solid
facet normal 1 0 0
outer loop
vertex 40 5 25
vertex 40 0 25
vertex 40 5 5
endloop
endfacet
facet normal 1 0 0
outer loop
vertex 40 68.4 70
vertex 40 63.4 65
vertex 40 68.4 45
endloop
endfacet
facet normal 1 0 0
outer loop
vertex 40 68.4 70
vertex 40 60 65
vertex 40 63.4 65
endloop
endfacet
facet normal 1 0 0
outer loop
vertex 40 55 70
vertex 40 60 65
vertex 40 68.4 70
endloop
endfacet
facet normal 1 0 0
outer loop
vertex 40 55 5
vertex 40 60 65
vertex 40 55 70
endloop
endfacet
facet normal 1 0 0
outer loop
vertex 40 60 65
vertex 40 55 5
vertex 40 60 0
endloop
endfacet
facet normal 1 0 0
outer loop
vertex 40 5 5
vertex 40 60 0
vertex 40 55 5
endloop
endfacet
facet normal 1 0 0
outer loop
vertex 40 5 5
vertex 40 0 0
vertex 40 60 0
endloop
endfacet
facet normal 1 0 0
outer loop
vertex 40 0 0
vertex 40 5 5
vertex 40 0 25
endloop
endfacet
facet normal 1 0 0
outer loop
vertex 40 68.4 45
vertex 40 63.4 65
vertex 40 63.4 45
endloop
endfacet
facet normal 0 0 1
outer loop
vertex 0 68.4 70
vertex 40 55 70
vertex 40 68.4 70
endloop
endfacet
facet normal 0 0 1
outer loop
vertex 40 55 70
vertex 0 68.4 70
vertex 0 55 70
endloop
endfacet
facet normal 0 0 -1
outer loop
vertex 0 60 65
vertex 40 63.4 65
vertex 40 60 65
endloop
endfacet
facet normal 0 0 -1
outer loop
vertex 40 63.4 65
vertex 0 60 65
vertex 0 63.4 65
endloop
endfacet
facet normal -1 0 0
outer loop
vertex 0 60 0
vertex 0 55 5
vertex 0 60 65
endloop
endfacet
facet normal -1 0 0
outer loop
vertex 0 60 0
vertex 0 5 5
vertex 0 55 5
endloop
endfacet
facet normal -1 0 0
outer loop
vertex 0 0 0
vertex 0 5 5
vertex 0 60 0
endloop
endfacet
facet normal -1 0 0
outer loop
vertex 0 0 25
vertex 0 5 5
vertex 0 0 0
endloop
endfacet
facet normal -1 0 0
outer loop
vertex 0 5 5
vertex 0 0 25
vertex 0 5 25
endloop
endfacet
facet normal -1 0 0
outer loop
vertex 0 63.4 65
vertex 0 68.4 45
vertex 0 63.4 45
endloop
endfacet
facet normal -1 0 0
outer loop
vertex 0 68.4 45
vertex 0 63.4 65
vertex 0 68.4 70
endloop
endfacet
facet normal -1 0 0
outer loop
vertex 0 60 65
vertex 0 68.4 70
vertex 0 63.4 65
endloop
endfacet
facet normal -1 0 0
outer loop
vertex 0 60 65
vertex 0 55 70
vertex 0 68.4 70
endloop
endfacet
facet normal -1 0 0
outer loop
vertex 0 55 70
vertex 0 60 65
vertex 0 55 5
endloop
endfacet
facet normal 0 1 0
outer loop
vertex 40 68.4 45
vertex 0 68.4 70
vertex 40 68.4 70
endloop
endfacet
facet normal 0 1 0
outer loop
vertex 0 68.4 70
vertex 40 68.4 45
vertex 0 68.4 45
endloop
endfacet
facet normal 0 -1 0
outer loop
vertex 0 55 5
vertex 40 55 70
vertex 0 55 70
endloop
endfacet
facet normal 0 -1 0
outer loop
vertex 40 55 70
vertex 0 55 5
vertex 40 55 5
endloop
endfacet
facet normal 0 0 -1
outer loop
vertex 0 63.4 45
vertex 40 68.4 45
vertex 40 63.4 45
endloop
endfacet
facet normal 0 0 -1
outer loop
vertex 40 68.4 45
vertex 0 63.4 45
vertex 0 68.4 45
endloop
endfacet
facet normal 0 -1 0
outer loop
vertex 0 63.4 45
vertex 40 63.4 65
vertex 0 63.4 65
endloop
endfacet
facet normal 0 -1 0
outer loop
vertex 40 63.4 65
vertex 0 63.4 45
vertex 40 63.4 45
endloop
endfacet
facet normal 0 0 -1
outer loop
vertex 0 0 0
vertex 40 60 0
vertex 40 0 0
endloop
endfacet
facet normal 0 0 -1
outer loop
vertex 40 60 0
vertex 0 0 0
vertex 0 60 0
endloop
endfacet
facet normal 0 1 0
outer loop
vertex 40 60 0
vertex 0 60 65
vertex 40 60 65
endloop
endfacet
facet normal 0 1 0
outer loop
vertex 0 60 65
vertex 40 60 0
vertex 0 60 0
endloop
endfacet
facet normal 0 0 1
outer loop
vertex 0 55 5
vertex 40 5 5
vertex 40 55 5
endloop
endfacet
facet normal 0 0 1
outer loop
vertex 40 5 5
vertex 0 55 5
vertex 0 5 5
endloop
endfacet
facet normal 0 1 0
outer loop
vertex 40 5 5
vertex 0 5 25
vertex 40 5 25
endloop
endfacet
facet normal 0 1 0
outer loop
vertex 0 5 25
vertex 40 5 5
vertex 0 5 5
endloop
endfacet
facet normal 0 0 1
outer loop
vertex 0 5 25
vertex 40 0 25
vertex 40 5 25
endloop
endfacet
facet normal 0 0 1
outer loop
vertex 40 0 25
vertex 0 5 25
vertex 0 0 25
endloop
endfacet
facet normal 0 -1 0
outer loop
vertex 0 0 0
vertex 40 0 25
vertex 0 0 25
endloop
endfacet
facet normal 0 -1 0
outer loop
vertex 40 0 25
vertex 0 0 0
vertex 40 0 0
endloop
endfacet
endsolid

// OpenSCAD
// Render Controls
$fa = 1;
$fs = 0.4;

// Dimensions
hookWidth = 40;
baseHeight = 45;
hookDepth = 5;
hangerLength = 20;
hookLength = 60;
hangerGap = 3.4;

// Model
render () {
  cube ([hookWidth, hookDepth, hookDepth + hangerLength]);

  translate ([0, hookDepth, 0]) {
    cube ([hookWidth, baseHeight + hookDepth, hookDepth]);

    translate ([0, baseHeight + hookDepth, 0]) {
      cube ([hookWidth, hookDepth, hookLength + (2 * hookDepth)]);

      translate ([0, 0, hookLength + hookDepth]) {
        cube ([hookWidth, hangerGap + (2 * hookDepth), hookDepth]);

        translate ([0, hangerGap + hookDepth, -hangerLength]) {
          cube([hookWidth, hookDepth, hookDepth + hangerLength]);
        }
      }
    }
  }
}
